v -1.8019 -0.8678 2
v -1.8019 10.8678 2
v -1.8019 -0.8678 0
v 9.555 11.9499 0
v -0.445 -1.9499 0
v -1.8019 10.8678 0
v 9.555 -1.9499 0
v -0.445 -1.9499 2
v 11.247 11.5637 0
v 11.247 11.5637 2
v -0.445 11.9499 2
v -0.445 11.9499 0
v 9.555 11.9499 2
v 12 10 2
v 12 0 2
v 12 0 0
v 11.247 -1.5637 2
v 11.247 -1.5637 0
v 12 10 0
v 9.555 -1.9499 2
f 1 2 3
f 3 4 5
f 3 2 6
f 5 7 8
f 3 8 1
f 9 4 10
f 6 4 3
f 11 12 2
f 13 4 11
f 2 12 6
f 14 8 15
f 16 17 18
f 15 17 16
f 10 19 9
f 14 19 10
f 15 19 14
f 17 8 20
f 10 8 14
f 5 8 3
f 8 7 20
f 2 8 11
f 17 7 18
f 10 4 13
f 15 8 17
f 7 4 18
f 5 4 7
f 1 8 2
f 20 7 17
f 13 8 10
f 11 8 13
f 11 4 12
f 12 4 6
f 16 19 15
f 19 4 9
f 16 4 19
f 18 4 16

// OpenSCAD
// Unit of length: Unit.MM
minkowski()
{
   cube(size = [10.0, 10.0, 1.0], center = false);
   cylinder(h = 1.0, d = 4.0, center = false);
}
